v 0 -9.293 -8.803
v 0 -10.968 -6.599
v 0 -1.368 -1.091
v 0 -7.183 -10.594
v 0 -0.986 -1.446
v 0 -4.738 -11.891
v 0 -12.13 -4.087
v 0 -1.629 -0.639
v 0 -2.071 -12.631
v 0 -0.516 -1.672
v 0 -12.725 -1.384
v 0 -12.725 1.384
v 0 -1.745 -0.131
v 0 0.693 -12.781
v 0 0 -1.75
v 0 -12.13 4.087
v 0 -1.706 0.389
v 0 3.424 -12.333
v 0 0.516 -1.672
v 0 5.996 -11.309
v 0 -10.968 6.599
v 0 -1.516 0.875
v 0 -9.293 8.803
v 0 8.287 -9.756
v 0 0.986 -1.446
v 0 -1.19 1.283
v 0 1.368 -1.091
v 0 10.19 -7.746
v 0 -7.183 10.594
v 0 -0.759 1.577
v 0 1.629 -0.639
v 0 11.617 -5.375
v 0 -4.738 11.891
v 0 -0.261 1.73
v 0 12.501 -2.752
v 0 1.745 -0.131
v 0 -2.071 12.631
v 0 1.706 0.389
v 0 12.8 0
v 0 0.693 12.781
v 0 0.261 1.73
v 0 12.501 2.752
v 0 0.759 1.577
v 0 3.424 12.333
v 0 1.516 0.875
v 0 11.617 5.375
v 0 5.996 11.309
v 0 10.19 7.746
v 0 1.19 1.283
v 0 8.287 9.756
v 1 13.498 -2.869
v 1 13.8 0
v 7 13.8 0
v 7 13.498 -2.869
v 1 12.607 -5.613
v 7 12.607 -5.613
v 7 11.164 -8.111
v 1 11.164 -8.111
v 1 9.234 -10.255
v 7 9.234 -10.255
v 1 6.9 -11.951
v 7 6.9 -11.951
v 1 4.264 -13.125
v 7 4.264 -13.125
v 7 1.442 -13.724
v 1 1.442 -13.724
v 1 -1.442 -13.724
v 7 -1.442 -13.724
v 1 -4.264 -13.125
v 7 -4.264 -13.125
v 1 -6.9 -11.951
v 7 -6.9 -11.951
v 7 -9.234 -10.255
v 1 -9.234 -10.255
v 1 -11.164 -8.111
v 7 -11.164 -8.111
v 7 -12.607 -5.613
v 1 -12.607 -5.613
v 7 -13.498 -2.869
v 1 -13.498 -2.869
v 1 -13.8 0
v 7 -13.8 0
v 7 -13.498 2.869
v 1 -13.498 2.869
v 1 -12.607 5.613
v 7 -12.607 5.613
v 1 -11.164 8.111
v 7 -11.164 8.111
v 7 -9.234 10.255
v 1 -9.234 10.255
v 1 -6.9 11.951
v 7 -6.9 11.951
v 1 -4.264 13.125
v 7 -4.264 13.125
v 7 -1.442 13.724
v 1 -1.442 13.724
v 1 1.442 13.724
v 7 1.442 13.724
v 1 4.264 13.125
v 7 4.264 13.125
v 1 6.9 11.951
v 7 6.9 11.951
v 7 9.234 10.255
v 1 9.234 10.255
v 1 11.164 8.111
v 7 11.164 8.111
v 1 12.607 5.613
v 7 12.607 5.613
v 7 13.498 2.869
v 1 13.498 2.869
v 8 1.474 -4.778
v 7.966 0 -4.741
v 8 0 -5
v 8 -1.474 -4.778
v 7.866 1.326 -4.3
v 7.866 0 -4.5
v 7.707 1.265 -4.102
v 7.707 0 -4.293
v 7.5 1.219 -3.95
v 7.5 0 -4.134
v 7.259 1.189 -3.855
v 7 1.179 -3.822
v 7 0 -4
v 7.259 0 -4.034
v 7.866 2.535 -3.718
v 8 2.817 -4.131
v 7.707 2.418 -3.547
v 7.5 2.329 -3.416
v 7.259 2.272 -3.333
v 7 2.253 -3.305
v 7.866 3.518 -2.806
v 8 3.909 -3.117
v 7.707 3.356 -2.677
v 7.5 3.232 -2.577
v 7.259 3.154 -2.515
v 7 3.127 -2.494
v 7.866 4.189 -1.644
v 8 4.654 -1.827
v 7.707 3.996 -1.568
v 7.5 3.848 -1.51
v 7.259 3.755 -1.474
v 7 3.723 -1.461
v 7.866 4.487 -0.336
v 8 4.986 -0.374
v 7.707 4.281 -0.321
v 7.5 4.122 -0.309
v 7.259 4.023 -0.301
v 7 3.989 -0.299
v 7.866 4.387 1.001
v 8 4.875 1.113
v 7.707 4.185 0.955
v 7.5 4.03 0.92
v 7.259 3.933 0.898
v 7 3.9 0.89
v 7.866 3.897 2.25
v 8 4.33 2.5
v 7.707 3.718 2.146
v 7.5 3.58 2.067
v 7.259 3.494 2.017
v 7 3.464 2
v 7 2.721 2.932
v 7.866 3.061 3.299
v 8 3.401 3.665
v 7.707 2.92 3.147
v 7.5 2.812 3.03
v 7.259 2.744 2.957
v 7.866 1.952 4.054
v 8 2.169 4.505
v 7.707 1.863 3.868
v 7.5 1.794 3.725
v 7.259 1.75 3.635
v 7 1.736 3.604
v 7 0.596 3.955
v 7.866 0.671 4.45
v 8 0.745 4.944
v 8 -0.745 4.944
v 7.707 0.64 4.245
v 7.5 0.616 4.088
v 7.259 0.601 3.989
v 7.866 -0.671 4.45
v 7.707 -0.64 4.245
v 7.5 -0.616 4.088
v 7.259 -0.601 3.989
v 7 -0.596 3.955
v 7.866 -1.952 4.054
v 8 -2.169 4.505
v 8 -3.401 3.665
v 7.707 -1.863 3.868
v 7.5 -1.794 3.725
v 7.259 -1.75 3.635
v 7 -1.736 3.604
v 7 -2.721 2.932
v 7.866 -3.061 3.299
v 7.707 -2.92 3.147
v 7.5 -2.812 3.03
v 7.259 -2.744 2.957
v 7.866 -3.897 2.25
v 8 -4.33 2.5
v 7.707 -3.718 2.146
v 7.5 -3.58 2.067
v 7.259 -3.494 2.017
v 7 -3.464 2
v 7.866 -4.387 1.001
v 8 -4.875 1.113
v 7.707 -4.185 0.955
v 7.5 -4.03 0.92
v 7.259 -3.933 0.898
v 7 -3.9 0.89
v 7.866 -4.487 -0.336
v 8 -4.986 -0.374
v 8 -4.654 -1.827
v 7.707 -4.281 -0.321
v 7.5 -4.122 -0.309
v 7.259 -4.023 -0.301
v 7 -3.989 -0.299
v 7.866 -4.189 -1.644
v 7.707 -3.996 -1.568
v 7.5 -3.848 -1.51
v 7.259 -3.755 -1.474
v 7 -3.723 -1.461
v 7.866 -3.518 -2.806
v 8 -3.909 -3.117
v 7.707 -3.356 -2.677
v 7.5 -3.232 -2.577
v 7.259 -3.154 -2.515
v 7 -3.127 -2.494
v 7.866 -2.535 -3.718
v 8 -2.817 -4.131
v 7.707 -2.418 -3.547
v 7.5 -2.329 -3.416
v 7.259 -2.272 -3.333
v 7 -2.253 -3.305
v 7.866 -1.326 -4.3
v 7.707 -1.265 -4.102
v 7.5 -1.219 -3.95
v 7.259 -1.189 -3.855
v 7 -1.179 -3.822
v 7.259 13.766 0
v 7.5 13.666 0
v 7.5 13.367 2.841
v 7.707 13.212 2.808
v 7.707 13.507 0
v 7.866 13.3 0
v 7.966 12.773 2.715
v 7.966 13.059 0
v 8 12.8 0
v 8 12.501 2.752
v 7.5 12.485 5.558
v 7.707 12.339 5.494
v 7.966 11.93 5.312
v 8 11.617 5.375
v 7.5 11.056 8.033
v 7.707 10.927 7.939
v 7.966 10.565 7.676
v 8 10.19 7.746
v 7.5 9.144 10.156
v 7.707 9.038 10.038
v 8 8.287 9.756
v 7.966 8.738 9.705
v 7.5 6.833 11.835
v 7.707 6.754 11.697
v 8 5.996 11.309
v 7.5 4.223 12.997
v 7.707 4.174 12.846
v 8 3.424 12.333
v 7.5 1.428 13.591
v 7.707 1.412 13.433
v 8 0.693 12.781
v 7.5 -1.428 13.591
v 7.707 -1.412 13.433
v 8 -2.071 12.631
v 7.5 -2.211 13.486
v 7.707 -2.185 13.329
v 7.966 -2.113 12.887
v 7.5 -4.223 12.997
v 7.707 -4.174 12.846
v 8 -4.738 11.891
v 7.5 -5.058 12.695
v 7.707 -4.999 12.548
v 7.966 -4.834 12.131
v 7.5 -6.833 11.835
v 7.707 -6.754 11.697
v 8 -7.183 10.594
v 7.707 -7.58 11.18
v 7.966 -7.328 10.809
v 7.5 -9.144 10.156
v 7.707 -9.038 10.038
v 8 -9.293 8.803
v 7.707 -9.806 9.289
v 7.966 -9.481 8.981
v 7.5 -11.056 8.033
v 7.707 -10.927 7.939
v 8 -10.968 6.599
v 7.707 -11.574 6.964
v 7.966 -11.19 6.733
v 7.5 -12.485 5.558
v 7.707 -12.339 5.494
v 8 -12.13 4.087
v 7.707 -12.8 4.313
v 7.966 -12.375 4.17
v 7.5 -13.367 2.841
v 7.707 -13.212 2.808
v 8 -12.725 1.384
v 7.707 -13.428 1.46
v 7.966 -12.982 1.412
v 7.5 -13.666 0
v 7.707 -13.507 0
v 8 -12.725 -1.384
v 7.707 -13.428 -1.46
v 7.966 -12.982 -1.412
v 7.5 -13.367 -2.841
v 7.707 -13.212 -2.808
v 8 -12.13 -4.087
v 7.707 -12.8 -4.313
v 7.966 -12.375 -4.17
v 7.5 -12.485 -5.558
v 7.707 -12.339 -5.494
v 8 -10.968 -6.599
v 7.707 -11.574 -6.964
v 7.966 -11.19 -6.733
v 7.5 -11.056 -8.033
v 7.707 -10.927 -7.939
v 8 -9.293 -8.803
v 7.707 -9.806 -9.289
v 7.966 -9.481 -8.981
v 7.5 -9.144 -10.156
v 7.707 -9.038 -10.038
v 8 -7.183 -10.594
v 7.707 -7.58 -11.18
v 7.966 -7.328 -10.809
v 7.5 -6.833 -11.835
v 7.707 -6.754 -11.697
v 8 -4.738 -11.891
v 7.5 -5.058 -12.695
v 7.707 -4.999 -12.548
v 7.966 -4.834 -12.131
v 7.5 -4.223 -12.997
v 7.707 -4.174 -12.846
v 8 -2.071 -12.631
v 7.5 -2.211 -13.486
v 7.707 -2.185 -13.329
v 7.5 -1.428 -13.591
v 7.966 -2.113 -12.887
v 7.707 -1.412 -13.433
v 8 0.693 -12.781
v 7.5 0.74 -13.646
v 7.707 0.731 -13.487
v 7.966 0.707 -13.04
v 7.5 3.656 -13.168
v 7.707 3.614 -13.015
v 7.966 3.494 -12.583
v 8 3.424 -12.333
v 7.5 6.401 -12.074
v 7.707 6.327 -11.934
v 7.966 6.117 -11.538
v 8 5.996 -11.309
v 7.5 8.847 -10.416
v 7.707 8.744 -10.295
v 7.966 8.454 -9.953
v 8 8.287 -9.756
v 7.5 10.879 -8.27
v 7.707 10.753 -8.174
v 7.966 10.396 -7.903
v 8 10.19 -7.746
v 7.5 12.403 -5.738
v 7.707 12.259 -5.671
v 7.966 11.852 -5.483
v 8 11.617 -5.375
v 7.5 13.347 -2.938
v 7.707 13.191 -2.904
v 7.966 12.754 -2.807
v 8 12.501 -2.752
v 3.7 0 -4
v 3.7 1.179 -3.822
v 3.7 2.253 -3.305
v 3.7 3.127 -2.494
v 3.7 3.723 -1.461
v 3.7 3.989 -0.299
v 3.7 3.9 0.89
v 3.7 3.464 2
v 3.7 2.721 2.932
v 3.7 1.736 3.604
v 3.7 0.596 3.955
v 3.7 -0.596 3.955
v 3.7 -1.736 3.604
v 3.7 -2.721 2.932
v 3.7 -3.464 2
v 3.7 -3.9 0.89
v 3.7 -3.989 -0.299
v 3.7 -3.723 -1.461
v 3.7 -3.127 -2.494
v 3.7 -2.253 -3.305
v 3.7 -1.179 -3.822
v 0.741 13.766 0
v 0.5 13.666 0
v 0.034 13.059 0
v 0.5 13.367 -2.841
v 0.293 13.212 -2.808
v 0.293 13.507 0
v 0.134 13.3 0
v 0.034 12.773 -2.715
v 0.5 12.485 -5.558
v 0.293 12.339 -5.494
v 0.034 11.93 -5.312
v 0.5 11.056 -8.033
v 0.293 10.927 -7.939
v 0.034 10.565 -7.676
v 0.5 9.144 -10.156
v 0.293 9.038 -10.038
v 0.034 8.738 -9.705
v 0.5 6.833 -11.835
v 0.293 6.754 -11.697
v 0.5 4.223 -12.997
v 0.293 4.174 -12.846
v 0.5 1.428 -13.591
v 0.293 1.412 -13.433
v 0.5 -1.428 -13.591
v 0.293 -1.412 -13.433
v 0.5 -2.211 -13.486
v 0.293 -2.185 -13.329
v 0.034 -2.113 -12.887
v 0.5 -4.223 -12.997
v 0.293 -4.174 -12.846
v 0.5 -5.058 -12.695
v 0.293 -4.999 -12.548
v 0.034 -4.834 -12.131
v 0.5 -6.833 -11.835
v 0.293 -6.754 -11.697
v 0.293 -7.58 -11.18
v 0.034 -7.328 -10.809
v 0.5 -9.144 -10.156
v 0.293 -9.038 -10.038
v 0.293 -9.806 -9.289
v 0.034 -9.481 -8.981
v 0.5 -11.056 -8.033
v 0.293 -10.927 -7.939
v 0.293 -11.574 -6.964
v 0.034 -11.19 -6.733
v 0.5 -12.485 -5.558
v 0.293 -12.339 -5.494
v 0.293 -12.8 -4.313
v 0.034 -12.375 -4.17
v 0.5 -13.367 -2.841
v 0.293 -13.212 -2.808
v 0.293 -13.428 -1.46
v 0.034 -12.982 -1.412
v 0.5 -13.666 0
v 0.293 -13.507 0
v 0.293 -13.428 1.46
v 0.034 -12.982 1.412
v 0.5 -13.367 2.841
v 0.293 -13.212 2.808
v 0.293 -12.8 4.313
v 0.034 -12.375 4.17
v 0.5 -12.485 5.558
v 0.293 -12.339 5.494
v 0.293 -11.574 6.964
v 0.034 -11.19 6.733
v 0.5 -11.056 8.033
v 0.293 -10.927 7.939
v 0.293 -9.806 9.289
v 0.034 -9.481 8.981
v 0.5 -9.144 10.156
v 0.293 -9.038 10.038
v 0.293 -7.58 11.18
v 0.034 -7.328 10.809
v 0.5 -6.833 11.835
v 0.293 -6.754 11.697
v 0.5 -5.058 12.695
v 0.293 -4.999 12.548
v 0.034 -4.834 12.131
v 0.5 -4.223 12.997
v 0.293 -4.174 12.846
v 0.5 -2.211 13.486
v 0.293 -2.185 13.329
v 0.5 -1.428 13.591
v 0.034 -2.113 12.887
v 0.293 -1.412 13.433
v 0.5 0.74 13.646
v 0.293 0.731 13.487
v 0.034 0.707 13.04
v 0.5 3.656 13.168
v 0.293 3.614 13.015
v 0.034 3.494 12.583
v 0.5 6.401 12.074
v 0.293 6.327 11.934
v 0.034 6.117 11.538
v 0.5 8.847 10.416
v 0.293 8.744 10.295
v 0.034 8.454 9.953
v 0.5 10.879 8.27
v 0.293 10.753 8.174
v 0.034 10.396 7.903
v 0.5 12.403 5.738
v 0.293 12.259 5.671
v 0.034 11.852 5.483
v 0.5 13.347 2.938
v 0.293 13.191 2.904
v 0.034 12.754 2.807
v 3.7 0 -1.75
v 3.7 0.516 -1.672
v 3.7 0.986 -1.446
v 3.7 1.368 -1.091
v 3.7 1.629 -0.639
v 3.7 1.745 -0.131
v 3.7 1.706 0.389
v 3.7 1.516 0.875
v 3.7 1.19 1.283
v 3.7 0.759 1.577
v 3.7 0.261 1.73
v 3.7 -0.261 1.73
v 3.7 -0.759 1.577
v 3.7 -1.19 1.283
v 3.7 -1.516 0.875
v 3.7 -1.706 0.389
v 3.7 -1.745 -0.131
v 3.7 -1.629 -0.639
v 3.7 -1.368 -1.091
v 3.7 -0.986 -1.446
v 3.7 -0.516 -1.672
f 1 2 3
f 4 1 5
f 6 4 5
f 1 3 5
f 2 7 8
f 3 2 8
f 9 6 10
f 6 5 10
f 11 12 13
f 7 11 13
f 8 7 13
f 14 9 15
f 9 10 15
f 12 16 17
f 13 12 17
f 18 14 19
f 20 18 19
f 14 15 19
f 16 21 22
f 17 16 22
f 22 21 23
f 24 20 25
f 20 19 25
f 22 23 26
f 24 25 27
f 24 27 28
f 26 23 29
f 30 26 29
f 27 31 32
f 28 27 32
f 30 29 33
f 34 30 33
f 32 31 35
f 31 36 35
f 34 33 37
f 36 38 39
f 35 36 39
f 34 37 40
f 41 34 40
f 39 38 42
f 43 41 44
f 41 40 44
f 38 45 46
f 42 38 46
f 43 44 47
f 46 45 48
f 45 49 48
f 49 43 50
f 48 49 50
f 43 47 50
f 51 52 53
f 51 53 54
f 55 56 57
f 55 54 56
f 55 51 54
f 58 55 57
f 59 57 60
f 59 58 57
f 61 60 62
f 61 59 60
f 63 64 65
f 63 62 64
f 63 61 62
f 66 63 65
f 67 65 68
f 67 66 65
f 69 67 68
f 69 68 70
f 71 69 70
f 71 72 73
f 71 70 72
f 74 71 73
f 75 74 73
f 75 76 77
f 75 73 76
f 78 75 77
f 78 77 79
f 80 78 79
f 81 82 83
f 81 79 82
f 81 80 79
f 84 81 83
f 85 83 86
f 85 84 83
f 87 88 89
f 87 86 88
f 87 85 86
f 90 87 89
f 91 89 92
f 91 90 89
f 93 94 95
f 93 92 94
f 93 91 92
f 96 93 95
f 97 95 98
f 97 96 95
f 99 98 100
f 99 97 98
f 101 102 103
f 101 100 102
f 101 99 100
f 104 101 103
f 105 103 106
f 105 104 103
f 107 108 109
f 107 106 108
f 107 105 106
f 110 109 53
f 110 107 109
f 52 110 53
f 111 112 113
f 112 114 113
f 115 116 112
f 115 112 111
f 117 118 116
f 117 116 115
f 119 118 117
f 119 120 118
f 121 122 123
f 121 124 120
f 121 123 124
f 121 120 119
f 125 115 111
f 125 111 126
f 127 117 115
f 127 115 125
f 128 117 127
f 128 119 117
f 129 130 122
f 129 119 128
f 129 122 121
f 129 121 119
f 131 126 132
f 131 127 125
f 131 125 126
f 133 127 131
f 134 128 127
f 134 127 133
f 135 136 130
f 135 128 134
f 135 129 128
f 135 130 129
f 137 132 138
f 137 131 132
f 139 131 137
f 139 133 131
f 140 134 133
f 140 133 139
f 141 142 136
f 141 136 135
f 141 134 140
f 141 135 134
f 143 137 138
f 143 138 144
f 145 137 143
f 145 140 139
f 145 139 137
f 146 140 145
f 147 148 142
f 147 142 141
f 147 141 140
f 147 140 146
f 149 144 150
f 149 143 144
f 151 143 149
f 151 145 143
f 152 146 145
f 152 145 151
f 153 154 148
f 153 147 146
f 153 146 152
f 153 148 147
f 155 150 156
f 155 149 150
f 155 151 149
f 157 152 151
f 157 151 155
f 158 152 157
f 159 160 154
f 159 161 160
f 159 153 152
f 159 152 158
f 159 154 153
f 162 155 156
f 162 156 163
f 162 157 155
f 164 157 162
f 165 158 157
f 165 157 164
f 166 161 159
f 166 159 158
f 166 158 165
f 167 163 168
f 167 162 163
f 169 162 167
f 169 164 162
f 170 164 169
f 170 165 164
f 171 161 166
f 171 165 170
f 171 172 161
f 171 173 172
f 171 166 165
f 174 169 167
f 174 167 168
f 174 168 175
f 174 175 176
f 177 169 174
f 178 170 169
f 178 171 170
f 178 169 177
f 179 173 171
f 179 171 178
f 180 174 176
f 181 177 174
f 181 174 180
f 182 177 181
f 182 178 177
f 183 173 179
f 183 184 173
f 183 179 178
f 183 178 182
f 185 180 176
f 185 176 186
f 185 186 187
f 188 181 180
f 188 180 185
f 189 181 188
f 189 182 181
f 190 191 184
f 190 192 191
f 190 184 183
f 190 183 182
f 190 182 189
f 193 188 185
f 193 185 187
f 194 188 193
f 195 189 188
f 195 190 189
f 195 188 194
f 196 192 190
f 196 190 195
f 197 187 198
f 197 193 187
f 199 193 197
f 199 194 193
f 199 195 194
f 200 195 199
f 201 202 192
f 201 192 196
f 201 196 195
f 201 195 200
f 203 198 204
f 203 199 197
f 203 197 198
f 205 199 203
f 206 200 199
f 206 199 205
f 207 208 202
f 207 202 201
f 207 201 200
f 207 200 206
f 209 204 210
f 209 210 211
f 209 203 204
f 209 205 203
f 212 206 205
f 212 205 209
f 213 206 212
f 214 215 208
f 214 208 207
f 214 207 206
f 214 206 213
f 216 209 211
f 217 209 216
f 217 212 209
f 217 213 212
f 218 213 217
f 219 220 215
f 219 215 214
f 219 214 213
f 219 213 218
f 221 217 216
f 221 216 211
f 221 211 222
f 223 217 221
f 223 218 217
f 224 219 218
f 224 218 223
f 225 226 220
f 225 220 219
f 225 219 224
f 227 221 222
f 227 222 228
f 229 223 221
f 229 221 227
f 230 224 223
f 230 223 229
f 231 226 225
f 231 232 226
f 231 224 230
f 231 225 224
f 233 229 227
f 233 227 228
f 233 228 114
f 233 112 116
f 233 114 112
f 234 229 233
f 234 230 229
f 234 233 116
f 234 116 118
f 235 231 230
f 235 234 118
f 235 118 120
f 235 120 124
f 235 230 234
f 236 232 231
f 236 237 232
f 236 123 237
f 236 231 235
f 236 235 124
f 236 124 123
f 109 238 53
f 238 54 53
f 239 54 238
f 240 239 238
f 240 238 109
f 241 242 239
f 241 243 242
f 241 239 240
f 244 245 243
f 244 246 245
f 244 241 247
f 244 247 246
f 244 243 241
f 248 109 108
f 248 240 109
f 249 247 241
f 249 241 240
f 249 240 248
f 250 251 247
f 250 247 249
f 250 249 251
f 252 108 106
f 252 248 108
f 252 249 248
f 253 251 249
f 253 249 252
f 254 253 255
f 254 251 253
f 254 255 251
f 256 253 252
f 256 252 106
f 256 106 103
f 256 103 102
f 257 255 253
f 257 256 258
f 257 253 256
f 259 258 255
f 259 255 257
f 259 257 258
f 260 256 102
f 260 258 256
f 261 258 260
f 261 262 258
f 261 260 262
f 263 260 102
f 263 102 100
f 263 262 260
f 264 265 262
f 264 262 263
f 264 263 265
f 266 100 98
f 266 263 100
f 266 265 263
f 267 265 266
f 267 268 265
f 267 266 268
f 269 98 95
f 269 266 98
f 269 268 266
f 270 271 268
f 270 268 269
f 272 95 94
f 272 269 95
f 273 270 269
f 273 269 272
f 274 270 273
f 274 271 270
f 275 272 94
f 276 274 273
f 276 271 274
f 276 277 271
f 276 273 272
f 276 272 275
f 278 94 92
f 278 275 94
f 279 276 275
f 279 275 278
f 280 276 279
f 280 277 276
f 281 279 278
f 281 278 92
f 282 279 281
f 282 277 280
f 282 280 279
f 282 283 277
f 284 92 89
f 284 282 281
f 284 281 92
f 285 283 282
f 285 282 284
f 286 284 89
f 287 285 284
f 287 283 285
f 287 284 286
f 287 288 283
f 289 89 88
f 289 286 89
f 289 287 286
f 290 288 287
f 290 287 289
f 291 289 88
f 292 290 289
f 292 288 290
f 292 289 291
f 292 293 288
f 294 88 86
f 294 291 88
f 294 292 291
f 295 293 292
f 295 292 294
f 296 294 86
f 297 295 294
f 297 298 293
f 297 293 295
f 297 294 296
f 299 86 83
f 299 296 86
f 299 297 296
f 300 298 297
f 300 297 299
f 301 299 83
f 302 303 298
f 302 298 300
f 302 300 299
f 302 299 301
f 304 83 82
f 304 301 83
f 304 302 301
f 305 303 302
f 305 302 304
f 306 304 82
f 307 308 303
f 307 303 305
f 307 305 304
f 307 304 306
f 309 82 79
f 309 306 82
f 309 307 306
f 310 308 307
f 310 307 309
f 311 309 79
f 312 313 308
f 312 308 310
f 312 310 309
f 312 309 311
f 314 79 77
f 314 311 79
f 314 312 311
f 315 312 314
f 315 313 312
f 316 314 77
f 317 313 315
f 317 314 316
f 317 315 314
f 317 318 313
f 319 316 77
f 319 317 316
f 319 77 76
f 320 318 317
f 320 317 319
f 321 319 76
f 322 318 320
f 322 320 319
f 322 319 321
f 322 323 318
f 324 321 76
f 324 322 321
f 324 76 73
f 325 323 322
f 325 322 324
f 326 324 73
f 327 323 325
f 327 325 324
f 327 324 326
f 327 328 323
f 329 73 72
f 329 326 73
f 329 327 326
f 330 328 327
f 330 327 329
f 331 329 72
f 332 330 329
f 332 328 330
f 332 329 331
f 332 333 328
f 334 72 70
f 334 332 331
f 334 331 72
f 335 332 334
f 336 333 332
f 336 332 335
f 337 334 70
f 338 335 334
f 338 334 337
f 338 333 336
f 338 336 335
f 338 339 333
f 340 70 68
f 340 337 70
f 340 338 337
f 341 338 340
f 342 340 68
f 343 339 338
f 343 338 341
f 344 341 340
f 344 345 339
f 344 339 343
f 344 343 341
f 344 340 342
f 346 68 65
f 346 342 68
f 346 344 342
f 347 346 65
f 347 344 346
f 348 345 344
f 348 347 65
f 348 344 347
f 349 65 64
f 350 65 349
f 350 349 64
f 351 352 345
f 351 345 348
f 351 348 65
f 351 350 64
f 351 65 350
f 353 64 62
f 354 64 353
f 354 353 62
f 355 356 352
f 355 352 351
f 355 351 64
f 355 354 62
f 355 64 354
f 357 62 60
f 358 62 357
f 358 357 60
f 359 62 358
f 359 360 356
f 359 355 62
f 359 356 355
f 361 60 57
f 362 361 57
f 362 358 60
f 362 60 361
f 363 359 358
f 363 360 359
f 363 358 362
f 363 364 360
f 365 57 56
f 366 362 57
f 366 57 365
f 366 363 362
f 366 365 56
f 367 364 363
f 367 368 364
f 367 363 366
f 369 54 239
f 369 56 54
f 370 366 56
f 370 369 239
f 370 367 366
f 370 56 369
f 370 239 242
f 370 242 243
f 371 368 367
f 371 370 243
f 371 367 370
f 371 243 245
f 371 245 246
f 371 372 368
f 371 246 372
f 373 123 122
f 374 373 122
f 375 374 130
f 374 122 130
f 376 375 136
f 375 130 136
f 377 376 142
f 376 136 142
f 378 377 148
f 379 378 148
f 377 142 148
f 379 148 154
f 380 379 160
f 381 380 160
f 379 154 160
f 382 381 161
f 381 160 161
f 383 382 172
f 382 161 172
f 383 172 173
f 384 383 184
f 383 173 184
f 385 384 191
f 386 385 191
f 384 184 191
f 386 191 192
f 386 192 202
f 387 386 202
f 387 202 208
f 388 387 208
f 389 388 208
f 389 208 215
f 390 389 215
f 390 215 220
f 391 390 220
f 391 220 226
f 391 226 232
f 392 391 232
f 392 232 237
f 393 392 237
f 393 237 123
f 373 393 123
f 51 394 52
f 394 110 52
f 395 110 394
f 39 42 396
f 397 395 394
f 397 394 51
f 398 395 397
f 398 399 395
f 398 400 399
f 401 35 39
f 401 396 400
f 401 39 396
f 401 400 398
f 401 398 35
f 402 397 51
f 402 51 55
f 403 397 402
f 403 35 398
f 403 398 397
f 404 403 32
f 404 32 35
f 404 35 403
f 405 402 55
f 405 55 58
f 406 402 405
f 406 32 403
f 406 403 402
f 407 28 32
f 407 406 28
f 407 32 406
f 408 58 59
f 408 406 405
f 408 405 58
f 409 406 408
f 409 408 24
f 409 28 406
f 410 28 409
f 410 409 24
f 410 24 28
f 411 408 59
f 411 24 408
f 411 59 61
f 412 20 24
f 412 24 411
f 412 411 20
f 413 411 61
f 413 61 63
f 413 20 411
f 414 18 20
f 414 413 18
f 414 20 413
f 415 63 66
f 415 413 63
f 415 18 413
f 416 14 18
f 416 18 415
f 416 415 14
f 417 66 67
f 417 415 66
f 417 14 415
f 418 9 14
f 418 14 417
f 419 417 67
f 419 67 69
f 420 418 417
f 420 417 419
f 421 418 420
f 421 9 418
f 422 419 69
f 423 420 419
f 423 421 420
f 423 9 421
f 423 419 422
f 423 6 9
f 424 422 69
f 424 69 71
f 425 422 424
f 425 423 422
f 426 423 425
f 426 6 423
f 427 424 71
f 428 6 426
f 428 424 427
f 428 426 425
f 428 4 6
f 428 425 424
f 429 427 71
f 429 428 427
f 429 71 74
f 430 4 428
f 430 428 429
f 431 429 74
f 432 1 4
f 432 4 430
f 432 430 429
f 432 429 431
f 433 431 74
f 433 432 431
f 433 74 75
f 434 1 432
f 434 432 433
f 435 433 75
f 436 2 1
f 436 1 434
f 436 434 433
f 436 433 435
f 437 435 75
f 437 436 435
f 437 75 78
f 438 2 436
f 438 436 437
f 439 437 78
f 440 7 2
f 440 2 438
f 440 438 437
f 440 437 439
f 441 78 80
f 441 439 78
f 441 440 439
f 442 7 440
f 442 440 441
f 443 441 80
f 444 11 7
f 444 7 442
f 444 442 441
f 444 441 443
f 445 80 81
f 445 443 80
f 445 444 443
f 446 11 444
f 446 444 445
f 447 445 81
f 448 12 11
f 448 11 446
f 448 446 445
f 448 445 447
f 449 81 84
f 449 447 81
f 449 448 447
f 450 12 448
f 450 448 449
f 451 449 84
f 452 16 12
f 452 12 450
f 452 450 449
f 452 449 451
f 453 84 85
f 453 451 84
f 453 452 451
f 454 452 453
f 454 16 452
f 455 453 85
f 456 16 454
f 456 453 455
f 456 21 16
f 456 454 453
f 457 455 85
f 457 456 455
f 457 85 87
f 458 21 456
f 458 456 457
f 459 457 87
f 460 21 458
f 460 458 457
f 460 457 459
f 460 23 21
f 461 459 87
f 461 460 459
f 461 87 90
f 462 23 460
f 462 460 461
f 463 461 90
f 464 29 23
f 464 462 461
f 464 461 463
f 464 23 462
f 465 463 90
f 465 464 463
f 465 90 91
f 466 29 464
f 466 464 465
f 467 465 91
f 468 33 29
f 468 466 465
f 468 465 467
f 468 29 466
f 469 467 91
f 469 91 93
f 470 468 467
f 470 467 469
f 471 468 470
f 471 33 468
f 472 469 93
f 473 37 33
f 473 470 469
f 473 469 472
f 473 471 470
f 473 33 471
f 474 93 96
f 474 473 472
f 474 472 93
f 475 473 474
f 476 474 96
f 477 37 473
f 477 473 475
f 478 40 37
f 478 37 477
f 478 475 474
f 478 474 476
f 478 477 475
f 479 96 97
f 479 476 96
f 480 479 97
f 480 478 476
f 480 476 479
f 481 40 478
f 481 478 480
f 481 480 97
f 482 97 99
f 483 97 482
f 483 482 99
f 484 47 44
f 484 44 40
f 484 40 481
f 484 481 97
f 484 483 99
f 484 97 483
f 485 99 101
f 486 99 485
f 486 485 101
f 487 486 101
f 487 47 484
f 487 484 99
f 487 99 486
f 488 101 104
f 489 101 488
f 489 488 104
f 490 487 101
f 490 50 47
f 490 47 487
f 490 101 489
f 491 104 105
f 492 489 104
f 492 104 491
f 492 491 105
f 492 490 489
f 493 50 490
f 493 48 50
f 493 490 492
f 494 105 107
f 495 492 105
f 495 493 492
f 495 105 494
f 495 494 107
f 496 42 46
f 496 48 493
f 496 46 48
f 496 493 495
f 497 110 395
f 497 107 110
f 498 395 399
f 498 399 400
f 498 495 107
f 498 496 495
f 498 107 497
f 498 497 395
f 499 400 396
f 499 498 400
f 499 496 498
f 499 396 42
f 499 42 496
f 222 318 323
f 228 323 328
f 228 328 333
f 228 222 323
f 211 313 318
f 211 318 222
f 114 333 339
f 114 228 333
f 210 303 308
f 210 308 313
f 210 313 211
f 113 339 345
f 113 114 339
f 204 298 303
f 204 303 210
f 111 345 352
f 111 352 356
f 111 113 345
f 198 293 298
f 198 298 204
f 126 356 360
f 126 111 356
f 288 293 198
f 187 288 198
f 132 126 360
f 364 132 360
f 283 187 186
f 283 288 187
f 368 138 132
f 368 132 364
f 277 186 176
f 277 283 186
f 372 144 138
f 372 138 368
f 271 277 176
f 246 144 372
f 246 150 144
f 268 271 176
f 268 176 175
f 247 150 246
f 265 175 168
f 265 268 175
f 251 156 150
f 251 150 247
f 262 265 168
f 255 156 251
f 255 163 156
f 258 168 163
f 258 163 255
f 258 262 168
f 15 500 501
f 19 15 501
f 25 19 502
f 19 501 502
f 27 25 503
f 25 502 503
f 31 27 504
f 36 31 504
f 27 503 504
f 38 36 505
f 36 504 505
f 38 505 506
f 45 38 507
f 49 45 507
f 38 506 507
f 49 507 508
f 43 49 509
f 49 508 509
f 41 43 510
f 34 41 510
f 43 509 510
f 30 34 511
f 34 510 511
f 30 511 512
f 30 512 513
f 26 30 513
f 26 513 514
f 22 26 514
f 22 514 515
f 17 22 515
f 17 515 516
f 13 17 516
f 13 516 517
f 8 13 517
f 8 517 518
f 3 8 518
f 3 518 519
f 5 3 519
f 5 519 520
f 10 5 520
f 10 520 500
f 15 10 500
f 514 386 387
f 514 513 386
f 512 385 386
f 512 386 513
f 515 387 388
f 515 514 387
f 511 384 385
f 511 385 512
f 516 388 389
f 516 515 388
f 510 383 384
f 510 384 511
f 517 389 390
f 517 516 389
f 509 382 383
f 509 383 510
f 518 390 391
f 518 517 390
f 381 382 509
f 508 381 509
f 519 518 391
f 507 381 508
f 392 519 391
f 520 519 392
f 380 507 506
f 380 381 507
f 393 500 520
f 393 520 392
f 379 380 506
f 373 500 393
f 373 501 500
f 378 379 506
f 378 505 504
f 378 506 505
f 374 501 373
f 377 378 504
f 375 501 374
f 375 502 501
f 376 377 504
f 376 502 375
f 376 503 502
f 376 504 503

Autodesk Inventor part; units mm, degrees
ref_plane "YZ Plane" through (0, 0, 0) normal (1, 0, 0) x (0, 1, 0)
ref_plane "XZ Plane" through (0, 0, 0) normal (0, 1, 0) x (-1, 0, 0)
ref_plane "XY Plane" through (0, 0, 0) normal (0, 0, 1) x (1, 0, 0)
sketch "Esquisse1" plane through (0, 0, 0) normal (1, 0, 0) x (0, 1, 0)
  circle A0 centre (0, 0) radius 13.8
  dimension "d0" = 27.6
extrude "Extrusion1" add sketch "Esquisse1" along normal blind 8
sketch "Esquisse4" plane through (8, 0, 0) normal (1, 0, 0) x (0, 0, -1)
  circle A0 centre (0, 0) radius 4
  dimension "d13" = 8
extrude "Extrusion4" cut sketch "Esquisse4" against normal blind 4.3
sketch "Esquisse5" plane through (3.7, 0, 0) normal (1, 0, 0) x (0, 0, -1)
  circle A0 centre (0, 0) radius 1.75
  dimension "d16" = 3.5
extrude "Extrusion5" cut sketch "Esquisse5" against normal blind 4.3
fillet "Congé4" radius 1 3 edges at (8, 0, 4) (0, -13.8, 0) (8, -13.8, 0)
properties part number "roue_Impression 3D"
